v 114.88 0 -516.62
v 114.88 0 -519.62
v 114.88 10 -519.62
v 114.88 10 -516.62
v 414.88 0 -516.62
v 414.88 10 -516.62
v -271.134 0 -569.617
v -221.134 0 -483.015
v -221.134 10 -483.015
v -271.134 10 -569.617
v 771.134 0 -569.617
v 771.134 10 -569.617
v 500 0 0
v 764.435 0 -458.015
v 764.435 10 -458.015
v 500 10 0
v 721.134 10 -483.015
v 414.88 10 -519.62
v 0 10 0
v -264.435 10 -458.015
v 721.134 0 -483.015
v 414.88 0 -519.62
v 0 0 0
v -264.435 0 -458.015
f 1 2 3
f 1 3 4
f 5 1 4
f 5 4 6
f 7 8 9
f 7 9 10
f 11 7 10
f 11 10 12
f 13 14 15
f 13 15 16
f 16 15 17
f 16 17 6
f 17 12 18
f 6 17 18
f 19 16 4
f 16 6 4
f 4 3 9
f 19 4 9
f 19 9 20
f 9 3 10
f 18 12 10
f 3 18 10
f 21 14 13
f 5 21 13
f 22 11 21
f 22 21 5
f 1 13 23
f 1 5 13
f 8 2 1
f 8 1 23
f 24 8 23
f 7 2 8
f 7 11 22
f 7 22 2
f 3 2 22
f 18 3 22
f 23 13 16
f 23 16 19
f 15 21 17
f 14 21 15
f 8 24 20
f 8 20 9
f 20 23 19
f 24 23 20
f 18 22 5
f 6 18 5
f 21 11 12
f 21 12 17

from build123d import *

# Parameters (mm, degrees)
BOSS_EXTRUDE1_DEPTH = 10
SKETCH2_W           = 300
SKETCH2_H           = 3
CUT_EXTRUDE1_DEPTH  = 959.755029562


with BuildPart() as part:
    # Sketch1 → Boss-Extrude1 (new body)
    with BuildSketch(Plane(origin=(0, 0, 0), x_dir=(1, 0, 0), z_dir=(0, 1, 0))):
        Polygon((-271.133729811, 569.617395678), (771.133729811, 569.617395678), (721.133729811, 483.014855299), (764.435, 458.014855299), (500, 0), (0, 0), (-264.435, 458.014855299), (-221.133729811, 483.014855299), align=None)
    extrude(amount=BOSS_EXTRUDE1_DEPTH)

    # Sketch2 → Cut-Extrude1 (cut, through all)
    with BuildSketch(Plane.XZ):
        with Locations((264.88, -518.12)):
            Rectangle(SKETCH2_W, SKETCH2_H)
    extrude(amount=-CUT_EXTRUDE1_DEPTH, mode=Mode.SUBTRACT)


solid = part.part
